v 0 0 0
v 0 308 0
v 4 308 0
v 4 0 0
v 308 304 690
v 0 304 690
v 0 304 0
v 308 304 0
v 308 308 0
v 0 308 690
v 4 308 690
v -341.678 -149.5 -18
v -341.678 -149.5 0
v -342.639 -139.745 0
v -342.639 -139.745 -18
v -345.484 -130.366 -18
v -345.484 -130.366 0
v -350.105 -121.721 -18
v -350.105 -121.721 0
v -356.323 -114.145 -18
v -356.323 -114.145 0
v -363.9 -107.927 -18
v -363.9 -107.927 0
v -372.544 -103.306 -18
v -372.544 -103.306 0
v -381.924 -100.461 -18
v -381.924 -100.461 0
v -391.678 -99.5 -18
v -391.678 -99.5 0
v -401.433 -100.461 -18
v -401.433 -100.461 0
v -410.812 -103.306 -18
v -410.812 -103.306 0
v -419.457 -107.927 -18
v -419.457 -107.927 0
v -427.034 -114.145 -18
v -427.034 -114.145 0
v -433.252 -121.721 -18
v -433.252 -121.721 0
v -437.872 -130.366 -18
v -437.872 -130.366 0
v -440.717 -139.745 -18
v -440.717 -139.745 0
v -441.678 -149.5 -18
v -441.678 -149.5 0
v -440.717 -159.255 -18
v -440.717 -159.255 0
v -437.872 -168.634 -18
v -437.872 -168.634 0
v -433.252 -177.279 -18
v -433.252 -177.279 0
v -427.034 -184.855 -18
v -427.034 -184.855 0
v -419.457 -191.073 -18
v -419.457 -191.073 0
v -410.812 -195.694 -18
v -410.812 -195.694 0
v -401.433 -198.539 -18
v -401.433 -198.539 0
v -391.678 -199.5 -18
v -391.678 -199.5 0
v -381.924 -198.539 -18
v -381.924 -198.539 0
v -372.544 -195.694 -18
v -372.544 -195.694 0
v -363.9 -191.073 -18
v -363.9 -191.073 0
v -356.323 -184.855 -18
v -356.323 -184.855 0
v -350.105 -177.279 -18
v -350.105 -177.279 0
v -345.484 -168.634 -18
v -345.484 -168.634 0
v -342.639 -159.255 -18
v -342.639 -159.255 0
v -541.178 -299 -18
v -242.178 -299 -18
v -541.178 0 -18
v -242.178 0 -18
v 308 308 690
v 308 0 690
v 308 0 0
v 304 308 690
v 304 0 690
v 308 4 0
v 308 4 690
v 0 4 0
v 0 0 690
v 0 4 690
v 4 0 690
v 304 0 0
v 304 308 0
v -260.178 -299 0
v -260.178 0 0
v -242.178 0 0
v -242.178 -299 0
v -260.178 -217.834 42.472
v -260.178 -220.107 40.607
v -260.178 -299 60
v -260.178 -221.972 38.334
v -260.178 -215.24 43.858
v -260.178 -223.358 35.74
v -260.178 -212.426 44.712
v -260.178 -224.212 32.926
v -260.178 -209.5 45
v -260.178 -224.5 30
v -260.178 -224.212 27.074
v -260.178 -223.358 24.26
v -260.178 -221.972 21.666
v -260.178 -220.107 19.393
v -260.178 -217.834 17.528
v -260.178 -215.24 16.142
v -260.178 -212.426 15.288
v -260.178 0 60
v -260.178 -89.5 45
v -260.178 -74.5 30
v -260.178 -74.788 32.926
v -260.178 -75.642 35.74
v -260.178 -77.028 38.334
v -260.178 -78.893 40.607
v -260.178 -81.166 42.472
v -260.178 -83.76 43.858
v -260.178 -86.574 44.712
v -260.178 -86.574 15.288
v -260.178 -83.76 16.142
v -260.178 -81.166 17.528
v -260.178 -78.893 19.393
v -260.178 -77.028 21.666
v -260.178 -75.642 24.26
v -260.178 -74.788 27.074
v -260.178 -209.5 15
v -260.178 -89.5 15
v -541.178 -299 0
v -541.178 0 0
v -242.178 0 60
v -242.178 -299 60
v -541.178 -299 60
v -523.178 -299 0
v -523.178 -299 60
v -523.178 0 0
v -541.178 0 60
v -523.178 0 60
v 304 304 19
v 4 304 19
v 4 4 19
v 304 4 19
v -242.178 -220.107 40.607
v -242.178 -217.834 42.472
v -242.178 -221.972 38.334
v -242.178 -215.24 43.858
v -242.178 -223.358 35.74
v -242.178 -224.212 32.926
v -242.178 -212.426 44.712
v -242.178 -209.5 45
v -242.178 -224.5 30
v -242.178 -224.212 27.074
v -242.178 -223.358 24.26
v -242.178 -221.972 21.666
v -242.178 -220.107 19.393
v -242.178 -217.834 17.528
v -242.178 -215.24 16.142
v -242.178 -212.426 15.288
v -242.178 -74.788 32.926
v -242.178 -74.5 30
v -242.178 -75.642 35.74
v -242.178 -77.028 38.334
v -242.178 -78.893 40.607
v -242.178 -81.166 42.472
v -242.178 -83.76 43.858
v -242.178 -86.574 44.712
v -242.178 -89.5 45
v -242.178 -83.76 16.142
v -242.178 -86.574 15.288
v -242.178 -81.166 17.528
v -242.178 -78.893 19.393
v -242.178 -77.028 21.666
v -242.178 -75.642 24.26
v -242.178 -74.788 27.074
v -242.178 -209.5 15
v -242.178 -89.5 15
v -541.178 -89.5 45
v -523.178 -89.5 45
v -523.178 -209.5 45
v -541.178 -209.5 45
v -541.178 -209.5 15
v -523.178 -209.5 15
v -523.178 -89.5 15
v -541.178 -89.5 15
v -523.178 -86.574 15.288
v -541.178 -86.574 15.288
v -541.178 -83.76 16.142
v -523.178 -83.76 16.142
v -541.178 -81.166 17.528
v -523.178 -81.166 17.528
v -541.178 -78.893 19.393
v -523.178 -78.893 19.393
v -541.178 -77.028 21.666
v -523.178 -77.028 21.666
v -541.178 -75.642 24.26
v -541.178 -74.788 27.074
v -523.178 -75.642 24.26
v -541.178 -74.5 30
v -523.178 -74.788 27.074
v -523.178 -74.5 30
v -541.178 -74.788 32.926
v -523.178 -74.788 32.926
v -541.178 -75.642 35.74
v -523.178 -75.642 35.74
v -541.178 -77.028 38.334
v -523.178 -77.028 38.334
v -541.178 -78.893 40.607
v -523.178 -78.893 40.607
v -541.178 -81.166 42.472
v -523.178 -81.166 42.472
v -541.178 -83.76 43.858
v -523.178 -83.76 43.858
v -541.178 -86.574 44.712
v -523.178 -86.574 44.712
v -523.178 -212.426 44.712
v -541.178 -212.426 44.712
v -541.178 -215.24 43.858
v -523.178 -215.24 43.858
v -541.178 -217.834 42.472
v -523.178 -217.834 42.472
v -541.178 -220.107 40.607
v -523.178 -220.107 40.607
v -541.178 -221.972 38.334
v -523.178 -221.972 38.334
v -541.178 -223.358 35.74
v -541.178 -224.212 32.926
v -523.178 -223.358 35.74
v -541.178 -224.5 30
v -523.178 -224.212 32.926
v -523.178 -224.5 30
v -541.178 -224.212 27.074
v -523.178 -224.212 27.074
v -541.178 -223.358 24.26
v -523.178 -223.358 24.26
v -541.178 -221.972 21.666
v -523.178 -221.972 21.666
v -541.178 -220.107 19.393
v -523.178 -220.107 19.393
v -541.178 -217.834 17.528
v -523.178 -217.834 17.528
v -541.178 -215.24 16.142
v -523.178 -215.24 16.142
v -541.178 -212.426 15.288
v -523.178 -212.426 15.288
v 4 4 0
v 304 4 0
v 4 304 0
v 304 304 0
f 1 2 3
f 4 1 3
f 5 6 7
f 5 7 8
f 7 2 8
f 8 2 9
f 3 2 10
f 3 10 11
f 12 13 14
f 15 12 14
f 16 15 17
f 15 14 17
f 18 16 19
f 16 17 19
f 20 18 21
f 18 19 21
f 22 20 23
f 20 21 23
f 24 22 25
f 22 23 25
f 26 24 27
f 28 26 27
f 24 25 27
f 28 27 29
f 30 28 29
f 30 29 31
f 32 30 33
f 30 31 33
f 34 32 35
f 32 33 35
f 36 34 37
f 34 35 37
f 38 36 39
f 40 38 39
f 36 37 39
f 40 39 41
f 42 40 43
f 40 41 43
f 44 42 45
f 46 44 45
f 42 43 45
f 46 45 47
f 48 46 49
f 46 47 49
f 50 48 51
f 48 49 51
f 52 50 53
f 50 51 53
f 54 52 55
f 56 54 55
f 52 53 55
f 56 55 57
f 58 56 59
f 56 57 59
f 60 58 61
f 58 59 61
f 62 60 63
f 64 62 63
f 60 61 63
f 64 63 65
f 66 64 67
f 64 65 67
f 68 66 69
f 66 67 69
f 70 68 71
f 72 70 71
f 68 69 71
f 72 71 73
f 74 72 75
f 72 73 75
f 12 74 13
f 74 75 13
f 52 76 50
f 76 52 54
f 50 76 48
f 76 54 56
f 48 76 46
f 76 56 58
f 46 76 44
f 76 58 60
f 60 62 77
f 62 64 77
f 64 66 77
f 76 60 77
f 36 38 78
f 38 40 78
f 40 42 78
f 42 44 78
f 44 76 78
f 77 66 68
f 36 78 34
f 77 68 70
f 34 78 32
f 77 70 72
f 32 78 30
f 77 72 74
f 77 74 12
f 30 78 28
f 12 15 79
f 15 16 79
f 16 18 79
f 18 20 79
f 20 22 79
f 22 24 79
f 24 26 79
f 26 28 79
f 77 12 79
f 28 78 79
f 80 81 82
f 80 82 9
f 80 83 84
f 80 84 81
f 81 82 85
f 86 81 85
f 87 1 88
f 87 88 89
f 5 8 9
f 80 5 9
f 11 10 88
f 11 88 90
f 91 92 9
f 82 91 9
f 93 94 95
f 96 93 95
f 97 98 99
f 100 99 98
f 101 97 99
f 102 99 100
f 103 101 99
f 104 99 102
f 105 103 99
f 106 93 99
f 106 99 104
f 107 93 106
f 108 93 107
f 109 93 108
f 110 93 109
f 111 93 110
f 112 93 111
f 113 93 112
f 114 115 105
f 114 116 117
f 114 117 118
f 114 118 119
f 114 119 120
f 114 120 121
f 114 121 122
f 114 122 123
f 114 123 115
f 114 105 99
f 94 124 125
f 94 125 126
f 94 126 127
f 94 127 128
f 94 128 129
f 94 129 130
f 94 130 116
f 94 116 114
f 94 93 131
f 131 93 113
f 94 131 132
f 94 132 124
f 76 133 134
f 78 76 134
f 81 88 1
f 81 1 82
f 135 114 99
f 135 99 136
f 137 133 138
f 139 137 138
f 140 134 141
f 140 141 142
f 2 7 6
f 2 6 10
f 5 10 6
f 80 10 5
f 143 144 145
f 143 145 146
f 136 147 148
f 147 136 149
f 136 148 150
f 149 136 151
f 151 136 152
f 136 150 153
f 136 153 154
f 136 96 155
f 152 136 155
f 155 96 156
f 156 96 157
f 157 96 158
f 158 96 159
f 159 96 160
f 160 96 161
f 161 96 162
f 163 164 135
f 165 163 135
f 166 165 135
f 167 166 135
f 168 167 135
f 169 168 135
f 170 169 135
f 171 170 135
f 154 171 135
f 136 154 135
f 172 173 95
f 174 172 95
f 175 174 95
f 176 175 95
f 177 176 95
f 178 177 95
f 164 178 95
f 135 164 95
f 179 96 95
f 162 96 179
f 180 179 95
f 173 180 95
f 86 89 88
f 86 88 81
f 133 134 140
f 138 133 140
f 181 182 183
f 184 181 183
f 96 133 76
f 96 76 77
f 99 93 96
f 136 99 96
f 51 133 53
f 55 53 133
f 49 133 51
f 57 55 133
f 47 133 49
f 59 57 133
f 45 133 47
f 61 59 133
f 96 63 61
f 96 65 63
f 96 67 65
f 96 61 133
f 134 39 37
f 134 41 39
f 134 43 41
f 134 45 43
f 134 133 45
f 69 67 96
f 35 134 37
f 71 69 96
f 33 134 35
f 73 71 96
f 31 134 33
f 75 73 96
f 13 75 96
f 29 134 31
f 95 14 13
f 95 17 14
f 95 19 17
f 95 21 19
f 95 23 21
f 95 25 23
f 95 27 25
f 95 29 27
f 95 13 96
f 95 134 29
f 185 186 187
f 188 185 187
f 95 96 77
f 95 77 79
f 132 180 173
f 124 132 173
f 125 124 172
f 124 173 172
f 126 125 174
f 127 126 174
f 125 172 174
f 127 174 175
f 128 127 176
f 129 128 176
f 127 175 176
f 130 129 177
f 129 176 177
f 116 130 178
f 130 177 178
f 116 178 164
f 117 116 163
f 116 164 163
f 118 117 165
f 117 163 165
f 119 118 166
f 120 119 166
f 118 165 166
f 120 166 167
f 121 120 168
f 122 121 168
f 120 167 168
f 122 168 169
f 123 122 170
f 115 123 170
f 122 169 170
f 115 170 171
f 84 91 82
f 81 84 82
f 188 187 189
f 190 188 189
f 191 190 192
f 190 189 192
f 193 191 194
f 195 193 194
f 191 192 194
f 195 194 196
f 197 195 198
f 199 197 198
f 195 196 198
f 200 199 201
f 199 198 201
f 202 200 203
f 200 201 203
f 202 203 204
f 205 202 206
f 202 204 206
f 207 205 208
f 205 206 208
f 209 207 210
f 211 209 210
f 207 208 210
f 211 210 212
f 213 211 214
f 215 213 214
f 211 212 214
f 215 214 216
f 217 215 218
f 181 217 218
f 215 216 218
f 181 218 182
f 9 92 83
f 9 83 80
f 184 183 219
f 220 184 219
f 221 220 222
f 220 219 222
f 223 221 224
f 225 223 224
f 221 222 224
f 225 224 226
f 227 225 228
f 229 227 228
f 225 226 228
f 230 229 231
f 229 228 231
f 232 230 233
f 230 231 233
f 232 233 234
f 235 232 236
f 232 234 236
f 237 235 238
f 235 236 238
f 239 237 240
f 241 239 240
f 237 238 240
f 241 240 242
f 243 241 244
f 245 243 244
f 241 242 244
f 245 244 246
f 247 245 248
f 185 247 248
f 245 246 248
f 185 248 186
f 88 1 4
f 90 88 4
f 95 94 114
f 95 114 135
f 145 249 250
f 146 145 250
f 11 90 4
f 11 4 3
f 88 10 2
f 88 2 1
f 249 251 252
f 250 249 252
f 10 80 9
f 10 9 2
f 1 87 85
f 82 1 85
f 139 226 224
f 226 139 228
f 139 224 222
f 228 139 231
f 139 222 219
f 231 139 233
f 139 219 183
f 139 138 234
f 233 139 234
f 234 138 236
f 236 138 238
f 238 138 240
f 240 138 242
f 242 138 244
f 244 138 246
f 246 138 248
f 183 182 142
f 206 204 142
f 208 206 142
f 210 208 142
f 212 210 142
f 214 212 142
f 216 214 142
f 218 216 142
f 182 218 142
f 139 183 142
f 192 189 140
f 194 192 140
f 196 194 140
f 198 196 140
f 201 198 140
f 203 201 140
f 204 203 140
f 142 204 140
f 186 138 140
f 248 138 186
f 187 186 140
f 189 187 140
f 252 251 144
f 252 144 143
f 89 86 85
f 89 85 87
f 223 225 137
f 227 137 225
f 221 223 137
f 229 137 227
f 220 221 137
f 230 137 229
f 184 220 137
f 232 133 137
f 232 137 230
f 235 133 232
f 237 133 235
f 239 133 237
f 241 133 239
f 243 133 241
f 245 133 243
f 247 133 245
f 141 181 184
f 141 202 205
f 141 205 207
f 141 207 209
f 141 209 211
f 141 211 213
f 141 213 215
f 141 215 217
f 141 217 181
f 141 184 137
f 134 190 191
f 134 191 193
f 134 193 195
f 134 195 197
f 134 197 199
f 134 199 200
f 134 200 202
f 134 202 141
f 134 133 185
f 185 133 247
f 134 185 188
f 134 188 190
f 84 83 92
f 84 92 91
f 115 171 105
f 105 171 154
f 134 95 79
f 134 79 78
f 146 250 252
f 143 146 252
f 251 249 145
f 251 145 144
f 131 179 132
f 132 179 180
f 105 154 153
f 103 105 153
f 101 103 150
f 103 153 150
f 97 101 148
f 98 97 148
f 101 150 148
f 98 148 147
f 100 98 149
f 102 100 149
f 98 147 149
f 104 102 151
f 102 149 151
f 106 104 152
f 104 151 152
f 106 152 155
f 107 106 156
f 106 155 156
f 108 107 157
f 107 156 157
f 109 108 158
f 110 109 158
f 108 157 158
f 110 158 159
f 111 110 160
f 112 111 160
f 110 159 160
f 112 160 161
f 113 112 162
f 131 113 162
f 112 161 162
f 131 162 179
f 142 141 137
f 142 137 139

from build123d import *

# Parameters (mm, degrees)
F1_W     = 4
F1_H     = 300
F1_H_2   = 4
F2_DEPTH = 690
F1_W_2   = 300
F3_DEPTH = 690
F4_DEPTH = 19
F5_W     = 18
F5_H     = 299
F5_W_2   = 263
F5_R     = 50
F6_DEPTH = 18
F7_DEPTH = 60
F9_DEPTH = 299.001


with BuildPart() as f2:
    # F1 (on Top) → F2 (new body)
    with BuildSketch(Plane.XY):
        with Locations((2, 154)):
            Rectangle(F1_W, F1_H)
        with Locations((2, 306)):
            Rectangle(F1_W, F1_H_2)
        with Locations((2, 2)):
            Rectangle(F1_W, F1_H_2)
    extrude(amount=F2_DEPTH)


with BuildPart() as f2b:
    # F1 (on Top) → F2, piece 2 (new body)
    with BuildSketch(Plane.XY):
        with Locations((306, 154)):
            Rectangle(F1_W, F1_H)
        with Locations((306, 306)):
            Rectangle(F1_W, F1_H_2)
        with Locations((306, 2)):
            Rectangle(F1_W, F1_H_2)
    extrude(amount=F2_DEPTH)


with BuildPart() as f3:
    # F1 (on Top) → F3 (new body)
    with BuildSketch(Plane.XY):
        with Locations((154, 2)):
            Rectangle(F1_W_2, F1_H_2)
        with Locations((2, 2)):
            Rectangle(F1_W, F1_H_2)
        with Locations((306, 2)):
            Rectangle(F1_W, F1_H_2)
    extrude(amount=F3_DEPTH)


with BuildPart() as f3b:
    # F1 (on Top) → F3, piece 2 (new body)
    with BuildSketch(Plane.XY):
        with Locations((306, 306)):
            Rectangle(F1_W, F1_H_2)
        with Locations((154, 306)):
            Rectangle(F1_W_2, F1_H_2)
        with Locations((2, 306)):
            Rectangle(F1_W, F1_H_2)
    extrude(amount=F3_DEPTH)


with BuildPart() as f4:
    # F1 (on Top) → F4 (new body)
    with BuildSketch(Plane.XY):
        with Locations((154, 154)):
            Rectangle(F1_W_2, F1_H)
    extrude(amount=F4_DEPTH)


with BuildPart() as f6:
    # F5 (on Top) → F6 (new body)
    with BuildSketch(Plane.XY):
        with Locations((-532.1781668663, -149.5)):
            Rectangle(F5_W, F5_H)
        with Locations((-391.6781668663, -149.5)):
            Rectangle(F5_W_2, F5_H)
        with Locations((-391.6781668663, -149.5)):
            Circle(F5_R, mode=Mode.SUBTRACT)
        with Locations((-251.1781668663, -149.5)):
            Rectangle(F5_W, F5_H)
    extrude(amount=-F6_DEPTH)


with BuildPart() as f7:
    # F5 (on Top) → F7 (new body)
    with BuildSketch(Plane.XY):
        with Locations((-532.1781668663, -149.5)):
            Rectangle(F5_W, F5_H)
    extrude(amount=F7_DEPTH)


with BuildPart() as f7b:
    # F5 (on Top) → F7, piece 2 (new body)
    with BuildSketch(Plane.XY):
        with Locations((-251.1781668663, -149.5)):
            Rectangle(F5_W, F5_H)
    extrude(amount=F7_DEPTH)


with BuildPart() as f9_tool:
    # F8 (on face) → F9 (new body, through all)
    with BuildSketch(Plane.YZ.offset(-242.1781668663)):
        with BuildLine():
            Line((-89.5, 45), (-209.5, 45))
            ThreePointArc((-209.5, 45), (-224.5, 30), (-209.5, 15))
            Line((-209.5, 15), (-89.5, 15))
            ThreePointArc((-89.5, 15), (-74.5, 30), (-89.5, 45))
        make_face()
    extrude(amount=-F9_DEPTH)


with BuildPart() as f7_1:
    add(f7.part)

    # F9: cut by f9_tool
    add(f9_tool.part, mode=Mode.SUBTRACT)


with BuildPart() as f7b_1:
    add(f7b.part)

    # F9: cut by f9_tool
    add(f9_tool.part, mode=Mode.SUBTRACT)


solid = Compound([f2.part, f2b.part, f3.part, f3b.part, f4.part, f6.part, f7_1.part, f7b_1.part])
